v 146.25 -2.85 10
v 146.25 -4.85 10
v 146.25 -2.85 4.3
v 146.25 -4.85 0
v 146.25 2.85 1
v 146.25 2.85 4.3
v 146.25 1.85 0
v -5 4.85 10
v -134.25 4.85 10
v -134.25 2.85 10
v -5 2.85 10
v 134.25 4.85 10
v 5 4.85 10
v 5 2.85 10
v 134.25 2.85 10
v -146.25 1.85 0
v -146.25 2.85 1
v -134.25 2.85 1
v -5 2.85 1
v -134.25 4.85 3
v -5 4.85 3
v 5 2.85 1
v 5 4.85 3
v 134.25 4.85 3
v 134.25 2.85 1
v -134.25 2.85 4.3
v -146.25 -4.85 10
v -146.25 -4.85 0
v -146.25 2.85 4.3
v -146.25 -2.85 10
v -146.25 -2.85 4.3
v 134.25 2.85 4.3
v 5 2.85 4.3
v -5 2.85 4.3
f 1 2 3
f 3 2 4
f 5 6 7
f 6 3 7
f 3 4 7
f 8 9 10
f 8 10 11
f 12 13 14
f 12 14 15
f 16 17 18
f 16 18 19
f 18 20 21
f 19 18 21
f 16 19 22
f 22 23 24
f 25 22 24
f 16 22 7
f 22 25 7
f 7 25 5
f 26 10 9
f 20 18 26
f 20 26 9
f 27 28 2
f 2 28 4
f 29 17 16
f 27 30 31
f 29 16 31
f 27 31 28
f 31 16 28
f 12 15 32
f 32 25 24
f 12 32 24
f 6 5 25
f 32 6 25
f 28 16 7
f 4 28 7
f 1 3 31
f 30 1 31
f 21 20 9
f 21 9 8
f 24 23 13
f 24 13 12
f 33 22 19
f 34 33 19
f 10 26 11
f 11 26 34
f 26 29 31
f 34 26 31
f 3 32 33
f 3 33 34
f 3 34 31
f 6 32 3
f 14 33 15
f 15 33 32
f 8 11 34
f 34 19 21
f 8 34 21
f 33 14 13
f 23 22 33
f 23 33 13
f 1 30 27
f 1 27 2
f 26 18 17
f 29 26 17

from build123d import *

# Parameters (mm, degrees)
F1_DEPTH = 4.3
F0_W     = 129.25
F0_H     = 2
F0_W_2   = 146.25
F2_DEPTH = 10
F3_SIZE  = 3


# Not quite as in the source:
# - a feature names something its author has since deleted; it is built from what else it names


with BuildPart() as f1:
    # F0 (on Top) → F1 (new body)
    with BuildSketch(Plane.XY):
        Polygon((0, 2.85), (0, -2.85), (146.25, -2.85), (146.25, 2.85), (139.25, 2.85), (134.25, 2.85), (5, 2.85), align=None)
        Polygon((-139.25, 2.85), (-146.25, 2.85), (-146.25, -2.85), (0, -2.85), (0, 2.85), (-5, 2.85), (-134.25, 2.85), align=None)
    extrude(amount=F1_DEPTH)

    # F0 (on Top) → F2 (join)
    with BuildSketch(Plane.XY):
        with Locations((69.625, 3.85)):
            Rectangle(F0_W, F0_H)
        with Locations((73.125, -3.85)):
            Rectangle(F0_W_2, F0_H)
        with Locations((-73.125, -3.85)):
            Rectangle(F0_W_2, F0_H)
        with Locations((-69.625, 3.85)):
            Rectangle(F0_W, F0_H)
    extrude(amount=F2_DEPTH)

    # F3
    f3_edges = [f1.edges().sort_by_distance(p)[0] for p in [
        (69.625, 4.85, 0),
    ]]
    chamfer(f3_edges, length=F3_SIZE)


solid = f1.part
